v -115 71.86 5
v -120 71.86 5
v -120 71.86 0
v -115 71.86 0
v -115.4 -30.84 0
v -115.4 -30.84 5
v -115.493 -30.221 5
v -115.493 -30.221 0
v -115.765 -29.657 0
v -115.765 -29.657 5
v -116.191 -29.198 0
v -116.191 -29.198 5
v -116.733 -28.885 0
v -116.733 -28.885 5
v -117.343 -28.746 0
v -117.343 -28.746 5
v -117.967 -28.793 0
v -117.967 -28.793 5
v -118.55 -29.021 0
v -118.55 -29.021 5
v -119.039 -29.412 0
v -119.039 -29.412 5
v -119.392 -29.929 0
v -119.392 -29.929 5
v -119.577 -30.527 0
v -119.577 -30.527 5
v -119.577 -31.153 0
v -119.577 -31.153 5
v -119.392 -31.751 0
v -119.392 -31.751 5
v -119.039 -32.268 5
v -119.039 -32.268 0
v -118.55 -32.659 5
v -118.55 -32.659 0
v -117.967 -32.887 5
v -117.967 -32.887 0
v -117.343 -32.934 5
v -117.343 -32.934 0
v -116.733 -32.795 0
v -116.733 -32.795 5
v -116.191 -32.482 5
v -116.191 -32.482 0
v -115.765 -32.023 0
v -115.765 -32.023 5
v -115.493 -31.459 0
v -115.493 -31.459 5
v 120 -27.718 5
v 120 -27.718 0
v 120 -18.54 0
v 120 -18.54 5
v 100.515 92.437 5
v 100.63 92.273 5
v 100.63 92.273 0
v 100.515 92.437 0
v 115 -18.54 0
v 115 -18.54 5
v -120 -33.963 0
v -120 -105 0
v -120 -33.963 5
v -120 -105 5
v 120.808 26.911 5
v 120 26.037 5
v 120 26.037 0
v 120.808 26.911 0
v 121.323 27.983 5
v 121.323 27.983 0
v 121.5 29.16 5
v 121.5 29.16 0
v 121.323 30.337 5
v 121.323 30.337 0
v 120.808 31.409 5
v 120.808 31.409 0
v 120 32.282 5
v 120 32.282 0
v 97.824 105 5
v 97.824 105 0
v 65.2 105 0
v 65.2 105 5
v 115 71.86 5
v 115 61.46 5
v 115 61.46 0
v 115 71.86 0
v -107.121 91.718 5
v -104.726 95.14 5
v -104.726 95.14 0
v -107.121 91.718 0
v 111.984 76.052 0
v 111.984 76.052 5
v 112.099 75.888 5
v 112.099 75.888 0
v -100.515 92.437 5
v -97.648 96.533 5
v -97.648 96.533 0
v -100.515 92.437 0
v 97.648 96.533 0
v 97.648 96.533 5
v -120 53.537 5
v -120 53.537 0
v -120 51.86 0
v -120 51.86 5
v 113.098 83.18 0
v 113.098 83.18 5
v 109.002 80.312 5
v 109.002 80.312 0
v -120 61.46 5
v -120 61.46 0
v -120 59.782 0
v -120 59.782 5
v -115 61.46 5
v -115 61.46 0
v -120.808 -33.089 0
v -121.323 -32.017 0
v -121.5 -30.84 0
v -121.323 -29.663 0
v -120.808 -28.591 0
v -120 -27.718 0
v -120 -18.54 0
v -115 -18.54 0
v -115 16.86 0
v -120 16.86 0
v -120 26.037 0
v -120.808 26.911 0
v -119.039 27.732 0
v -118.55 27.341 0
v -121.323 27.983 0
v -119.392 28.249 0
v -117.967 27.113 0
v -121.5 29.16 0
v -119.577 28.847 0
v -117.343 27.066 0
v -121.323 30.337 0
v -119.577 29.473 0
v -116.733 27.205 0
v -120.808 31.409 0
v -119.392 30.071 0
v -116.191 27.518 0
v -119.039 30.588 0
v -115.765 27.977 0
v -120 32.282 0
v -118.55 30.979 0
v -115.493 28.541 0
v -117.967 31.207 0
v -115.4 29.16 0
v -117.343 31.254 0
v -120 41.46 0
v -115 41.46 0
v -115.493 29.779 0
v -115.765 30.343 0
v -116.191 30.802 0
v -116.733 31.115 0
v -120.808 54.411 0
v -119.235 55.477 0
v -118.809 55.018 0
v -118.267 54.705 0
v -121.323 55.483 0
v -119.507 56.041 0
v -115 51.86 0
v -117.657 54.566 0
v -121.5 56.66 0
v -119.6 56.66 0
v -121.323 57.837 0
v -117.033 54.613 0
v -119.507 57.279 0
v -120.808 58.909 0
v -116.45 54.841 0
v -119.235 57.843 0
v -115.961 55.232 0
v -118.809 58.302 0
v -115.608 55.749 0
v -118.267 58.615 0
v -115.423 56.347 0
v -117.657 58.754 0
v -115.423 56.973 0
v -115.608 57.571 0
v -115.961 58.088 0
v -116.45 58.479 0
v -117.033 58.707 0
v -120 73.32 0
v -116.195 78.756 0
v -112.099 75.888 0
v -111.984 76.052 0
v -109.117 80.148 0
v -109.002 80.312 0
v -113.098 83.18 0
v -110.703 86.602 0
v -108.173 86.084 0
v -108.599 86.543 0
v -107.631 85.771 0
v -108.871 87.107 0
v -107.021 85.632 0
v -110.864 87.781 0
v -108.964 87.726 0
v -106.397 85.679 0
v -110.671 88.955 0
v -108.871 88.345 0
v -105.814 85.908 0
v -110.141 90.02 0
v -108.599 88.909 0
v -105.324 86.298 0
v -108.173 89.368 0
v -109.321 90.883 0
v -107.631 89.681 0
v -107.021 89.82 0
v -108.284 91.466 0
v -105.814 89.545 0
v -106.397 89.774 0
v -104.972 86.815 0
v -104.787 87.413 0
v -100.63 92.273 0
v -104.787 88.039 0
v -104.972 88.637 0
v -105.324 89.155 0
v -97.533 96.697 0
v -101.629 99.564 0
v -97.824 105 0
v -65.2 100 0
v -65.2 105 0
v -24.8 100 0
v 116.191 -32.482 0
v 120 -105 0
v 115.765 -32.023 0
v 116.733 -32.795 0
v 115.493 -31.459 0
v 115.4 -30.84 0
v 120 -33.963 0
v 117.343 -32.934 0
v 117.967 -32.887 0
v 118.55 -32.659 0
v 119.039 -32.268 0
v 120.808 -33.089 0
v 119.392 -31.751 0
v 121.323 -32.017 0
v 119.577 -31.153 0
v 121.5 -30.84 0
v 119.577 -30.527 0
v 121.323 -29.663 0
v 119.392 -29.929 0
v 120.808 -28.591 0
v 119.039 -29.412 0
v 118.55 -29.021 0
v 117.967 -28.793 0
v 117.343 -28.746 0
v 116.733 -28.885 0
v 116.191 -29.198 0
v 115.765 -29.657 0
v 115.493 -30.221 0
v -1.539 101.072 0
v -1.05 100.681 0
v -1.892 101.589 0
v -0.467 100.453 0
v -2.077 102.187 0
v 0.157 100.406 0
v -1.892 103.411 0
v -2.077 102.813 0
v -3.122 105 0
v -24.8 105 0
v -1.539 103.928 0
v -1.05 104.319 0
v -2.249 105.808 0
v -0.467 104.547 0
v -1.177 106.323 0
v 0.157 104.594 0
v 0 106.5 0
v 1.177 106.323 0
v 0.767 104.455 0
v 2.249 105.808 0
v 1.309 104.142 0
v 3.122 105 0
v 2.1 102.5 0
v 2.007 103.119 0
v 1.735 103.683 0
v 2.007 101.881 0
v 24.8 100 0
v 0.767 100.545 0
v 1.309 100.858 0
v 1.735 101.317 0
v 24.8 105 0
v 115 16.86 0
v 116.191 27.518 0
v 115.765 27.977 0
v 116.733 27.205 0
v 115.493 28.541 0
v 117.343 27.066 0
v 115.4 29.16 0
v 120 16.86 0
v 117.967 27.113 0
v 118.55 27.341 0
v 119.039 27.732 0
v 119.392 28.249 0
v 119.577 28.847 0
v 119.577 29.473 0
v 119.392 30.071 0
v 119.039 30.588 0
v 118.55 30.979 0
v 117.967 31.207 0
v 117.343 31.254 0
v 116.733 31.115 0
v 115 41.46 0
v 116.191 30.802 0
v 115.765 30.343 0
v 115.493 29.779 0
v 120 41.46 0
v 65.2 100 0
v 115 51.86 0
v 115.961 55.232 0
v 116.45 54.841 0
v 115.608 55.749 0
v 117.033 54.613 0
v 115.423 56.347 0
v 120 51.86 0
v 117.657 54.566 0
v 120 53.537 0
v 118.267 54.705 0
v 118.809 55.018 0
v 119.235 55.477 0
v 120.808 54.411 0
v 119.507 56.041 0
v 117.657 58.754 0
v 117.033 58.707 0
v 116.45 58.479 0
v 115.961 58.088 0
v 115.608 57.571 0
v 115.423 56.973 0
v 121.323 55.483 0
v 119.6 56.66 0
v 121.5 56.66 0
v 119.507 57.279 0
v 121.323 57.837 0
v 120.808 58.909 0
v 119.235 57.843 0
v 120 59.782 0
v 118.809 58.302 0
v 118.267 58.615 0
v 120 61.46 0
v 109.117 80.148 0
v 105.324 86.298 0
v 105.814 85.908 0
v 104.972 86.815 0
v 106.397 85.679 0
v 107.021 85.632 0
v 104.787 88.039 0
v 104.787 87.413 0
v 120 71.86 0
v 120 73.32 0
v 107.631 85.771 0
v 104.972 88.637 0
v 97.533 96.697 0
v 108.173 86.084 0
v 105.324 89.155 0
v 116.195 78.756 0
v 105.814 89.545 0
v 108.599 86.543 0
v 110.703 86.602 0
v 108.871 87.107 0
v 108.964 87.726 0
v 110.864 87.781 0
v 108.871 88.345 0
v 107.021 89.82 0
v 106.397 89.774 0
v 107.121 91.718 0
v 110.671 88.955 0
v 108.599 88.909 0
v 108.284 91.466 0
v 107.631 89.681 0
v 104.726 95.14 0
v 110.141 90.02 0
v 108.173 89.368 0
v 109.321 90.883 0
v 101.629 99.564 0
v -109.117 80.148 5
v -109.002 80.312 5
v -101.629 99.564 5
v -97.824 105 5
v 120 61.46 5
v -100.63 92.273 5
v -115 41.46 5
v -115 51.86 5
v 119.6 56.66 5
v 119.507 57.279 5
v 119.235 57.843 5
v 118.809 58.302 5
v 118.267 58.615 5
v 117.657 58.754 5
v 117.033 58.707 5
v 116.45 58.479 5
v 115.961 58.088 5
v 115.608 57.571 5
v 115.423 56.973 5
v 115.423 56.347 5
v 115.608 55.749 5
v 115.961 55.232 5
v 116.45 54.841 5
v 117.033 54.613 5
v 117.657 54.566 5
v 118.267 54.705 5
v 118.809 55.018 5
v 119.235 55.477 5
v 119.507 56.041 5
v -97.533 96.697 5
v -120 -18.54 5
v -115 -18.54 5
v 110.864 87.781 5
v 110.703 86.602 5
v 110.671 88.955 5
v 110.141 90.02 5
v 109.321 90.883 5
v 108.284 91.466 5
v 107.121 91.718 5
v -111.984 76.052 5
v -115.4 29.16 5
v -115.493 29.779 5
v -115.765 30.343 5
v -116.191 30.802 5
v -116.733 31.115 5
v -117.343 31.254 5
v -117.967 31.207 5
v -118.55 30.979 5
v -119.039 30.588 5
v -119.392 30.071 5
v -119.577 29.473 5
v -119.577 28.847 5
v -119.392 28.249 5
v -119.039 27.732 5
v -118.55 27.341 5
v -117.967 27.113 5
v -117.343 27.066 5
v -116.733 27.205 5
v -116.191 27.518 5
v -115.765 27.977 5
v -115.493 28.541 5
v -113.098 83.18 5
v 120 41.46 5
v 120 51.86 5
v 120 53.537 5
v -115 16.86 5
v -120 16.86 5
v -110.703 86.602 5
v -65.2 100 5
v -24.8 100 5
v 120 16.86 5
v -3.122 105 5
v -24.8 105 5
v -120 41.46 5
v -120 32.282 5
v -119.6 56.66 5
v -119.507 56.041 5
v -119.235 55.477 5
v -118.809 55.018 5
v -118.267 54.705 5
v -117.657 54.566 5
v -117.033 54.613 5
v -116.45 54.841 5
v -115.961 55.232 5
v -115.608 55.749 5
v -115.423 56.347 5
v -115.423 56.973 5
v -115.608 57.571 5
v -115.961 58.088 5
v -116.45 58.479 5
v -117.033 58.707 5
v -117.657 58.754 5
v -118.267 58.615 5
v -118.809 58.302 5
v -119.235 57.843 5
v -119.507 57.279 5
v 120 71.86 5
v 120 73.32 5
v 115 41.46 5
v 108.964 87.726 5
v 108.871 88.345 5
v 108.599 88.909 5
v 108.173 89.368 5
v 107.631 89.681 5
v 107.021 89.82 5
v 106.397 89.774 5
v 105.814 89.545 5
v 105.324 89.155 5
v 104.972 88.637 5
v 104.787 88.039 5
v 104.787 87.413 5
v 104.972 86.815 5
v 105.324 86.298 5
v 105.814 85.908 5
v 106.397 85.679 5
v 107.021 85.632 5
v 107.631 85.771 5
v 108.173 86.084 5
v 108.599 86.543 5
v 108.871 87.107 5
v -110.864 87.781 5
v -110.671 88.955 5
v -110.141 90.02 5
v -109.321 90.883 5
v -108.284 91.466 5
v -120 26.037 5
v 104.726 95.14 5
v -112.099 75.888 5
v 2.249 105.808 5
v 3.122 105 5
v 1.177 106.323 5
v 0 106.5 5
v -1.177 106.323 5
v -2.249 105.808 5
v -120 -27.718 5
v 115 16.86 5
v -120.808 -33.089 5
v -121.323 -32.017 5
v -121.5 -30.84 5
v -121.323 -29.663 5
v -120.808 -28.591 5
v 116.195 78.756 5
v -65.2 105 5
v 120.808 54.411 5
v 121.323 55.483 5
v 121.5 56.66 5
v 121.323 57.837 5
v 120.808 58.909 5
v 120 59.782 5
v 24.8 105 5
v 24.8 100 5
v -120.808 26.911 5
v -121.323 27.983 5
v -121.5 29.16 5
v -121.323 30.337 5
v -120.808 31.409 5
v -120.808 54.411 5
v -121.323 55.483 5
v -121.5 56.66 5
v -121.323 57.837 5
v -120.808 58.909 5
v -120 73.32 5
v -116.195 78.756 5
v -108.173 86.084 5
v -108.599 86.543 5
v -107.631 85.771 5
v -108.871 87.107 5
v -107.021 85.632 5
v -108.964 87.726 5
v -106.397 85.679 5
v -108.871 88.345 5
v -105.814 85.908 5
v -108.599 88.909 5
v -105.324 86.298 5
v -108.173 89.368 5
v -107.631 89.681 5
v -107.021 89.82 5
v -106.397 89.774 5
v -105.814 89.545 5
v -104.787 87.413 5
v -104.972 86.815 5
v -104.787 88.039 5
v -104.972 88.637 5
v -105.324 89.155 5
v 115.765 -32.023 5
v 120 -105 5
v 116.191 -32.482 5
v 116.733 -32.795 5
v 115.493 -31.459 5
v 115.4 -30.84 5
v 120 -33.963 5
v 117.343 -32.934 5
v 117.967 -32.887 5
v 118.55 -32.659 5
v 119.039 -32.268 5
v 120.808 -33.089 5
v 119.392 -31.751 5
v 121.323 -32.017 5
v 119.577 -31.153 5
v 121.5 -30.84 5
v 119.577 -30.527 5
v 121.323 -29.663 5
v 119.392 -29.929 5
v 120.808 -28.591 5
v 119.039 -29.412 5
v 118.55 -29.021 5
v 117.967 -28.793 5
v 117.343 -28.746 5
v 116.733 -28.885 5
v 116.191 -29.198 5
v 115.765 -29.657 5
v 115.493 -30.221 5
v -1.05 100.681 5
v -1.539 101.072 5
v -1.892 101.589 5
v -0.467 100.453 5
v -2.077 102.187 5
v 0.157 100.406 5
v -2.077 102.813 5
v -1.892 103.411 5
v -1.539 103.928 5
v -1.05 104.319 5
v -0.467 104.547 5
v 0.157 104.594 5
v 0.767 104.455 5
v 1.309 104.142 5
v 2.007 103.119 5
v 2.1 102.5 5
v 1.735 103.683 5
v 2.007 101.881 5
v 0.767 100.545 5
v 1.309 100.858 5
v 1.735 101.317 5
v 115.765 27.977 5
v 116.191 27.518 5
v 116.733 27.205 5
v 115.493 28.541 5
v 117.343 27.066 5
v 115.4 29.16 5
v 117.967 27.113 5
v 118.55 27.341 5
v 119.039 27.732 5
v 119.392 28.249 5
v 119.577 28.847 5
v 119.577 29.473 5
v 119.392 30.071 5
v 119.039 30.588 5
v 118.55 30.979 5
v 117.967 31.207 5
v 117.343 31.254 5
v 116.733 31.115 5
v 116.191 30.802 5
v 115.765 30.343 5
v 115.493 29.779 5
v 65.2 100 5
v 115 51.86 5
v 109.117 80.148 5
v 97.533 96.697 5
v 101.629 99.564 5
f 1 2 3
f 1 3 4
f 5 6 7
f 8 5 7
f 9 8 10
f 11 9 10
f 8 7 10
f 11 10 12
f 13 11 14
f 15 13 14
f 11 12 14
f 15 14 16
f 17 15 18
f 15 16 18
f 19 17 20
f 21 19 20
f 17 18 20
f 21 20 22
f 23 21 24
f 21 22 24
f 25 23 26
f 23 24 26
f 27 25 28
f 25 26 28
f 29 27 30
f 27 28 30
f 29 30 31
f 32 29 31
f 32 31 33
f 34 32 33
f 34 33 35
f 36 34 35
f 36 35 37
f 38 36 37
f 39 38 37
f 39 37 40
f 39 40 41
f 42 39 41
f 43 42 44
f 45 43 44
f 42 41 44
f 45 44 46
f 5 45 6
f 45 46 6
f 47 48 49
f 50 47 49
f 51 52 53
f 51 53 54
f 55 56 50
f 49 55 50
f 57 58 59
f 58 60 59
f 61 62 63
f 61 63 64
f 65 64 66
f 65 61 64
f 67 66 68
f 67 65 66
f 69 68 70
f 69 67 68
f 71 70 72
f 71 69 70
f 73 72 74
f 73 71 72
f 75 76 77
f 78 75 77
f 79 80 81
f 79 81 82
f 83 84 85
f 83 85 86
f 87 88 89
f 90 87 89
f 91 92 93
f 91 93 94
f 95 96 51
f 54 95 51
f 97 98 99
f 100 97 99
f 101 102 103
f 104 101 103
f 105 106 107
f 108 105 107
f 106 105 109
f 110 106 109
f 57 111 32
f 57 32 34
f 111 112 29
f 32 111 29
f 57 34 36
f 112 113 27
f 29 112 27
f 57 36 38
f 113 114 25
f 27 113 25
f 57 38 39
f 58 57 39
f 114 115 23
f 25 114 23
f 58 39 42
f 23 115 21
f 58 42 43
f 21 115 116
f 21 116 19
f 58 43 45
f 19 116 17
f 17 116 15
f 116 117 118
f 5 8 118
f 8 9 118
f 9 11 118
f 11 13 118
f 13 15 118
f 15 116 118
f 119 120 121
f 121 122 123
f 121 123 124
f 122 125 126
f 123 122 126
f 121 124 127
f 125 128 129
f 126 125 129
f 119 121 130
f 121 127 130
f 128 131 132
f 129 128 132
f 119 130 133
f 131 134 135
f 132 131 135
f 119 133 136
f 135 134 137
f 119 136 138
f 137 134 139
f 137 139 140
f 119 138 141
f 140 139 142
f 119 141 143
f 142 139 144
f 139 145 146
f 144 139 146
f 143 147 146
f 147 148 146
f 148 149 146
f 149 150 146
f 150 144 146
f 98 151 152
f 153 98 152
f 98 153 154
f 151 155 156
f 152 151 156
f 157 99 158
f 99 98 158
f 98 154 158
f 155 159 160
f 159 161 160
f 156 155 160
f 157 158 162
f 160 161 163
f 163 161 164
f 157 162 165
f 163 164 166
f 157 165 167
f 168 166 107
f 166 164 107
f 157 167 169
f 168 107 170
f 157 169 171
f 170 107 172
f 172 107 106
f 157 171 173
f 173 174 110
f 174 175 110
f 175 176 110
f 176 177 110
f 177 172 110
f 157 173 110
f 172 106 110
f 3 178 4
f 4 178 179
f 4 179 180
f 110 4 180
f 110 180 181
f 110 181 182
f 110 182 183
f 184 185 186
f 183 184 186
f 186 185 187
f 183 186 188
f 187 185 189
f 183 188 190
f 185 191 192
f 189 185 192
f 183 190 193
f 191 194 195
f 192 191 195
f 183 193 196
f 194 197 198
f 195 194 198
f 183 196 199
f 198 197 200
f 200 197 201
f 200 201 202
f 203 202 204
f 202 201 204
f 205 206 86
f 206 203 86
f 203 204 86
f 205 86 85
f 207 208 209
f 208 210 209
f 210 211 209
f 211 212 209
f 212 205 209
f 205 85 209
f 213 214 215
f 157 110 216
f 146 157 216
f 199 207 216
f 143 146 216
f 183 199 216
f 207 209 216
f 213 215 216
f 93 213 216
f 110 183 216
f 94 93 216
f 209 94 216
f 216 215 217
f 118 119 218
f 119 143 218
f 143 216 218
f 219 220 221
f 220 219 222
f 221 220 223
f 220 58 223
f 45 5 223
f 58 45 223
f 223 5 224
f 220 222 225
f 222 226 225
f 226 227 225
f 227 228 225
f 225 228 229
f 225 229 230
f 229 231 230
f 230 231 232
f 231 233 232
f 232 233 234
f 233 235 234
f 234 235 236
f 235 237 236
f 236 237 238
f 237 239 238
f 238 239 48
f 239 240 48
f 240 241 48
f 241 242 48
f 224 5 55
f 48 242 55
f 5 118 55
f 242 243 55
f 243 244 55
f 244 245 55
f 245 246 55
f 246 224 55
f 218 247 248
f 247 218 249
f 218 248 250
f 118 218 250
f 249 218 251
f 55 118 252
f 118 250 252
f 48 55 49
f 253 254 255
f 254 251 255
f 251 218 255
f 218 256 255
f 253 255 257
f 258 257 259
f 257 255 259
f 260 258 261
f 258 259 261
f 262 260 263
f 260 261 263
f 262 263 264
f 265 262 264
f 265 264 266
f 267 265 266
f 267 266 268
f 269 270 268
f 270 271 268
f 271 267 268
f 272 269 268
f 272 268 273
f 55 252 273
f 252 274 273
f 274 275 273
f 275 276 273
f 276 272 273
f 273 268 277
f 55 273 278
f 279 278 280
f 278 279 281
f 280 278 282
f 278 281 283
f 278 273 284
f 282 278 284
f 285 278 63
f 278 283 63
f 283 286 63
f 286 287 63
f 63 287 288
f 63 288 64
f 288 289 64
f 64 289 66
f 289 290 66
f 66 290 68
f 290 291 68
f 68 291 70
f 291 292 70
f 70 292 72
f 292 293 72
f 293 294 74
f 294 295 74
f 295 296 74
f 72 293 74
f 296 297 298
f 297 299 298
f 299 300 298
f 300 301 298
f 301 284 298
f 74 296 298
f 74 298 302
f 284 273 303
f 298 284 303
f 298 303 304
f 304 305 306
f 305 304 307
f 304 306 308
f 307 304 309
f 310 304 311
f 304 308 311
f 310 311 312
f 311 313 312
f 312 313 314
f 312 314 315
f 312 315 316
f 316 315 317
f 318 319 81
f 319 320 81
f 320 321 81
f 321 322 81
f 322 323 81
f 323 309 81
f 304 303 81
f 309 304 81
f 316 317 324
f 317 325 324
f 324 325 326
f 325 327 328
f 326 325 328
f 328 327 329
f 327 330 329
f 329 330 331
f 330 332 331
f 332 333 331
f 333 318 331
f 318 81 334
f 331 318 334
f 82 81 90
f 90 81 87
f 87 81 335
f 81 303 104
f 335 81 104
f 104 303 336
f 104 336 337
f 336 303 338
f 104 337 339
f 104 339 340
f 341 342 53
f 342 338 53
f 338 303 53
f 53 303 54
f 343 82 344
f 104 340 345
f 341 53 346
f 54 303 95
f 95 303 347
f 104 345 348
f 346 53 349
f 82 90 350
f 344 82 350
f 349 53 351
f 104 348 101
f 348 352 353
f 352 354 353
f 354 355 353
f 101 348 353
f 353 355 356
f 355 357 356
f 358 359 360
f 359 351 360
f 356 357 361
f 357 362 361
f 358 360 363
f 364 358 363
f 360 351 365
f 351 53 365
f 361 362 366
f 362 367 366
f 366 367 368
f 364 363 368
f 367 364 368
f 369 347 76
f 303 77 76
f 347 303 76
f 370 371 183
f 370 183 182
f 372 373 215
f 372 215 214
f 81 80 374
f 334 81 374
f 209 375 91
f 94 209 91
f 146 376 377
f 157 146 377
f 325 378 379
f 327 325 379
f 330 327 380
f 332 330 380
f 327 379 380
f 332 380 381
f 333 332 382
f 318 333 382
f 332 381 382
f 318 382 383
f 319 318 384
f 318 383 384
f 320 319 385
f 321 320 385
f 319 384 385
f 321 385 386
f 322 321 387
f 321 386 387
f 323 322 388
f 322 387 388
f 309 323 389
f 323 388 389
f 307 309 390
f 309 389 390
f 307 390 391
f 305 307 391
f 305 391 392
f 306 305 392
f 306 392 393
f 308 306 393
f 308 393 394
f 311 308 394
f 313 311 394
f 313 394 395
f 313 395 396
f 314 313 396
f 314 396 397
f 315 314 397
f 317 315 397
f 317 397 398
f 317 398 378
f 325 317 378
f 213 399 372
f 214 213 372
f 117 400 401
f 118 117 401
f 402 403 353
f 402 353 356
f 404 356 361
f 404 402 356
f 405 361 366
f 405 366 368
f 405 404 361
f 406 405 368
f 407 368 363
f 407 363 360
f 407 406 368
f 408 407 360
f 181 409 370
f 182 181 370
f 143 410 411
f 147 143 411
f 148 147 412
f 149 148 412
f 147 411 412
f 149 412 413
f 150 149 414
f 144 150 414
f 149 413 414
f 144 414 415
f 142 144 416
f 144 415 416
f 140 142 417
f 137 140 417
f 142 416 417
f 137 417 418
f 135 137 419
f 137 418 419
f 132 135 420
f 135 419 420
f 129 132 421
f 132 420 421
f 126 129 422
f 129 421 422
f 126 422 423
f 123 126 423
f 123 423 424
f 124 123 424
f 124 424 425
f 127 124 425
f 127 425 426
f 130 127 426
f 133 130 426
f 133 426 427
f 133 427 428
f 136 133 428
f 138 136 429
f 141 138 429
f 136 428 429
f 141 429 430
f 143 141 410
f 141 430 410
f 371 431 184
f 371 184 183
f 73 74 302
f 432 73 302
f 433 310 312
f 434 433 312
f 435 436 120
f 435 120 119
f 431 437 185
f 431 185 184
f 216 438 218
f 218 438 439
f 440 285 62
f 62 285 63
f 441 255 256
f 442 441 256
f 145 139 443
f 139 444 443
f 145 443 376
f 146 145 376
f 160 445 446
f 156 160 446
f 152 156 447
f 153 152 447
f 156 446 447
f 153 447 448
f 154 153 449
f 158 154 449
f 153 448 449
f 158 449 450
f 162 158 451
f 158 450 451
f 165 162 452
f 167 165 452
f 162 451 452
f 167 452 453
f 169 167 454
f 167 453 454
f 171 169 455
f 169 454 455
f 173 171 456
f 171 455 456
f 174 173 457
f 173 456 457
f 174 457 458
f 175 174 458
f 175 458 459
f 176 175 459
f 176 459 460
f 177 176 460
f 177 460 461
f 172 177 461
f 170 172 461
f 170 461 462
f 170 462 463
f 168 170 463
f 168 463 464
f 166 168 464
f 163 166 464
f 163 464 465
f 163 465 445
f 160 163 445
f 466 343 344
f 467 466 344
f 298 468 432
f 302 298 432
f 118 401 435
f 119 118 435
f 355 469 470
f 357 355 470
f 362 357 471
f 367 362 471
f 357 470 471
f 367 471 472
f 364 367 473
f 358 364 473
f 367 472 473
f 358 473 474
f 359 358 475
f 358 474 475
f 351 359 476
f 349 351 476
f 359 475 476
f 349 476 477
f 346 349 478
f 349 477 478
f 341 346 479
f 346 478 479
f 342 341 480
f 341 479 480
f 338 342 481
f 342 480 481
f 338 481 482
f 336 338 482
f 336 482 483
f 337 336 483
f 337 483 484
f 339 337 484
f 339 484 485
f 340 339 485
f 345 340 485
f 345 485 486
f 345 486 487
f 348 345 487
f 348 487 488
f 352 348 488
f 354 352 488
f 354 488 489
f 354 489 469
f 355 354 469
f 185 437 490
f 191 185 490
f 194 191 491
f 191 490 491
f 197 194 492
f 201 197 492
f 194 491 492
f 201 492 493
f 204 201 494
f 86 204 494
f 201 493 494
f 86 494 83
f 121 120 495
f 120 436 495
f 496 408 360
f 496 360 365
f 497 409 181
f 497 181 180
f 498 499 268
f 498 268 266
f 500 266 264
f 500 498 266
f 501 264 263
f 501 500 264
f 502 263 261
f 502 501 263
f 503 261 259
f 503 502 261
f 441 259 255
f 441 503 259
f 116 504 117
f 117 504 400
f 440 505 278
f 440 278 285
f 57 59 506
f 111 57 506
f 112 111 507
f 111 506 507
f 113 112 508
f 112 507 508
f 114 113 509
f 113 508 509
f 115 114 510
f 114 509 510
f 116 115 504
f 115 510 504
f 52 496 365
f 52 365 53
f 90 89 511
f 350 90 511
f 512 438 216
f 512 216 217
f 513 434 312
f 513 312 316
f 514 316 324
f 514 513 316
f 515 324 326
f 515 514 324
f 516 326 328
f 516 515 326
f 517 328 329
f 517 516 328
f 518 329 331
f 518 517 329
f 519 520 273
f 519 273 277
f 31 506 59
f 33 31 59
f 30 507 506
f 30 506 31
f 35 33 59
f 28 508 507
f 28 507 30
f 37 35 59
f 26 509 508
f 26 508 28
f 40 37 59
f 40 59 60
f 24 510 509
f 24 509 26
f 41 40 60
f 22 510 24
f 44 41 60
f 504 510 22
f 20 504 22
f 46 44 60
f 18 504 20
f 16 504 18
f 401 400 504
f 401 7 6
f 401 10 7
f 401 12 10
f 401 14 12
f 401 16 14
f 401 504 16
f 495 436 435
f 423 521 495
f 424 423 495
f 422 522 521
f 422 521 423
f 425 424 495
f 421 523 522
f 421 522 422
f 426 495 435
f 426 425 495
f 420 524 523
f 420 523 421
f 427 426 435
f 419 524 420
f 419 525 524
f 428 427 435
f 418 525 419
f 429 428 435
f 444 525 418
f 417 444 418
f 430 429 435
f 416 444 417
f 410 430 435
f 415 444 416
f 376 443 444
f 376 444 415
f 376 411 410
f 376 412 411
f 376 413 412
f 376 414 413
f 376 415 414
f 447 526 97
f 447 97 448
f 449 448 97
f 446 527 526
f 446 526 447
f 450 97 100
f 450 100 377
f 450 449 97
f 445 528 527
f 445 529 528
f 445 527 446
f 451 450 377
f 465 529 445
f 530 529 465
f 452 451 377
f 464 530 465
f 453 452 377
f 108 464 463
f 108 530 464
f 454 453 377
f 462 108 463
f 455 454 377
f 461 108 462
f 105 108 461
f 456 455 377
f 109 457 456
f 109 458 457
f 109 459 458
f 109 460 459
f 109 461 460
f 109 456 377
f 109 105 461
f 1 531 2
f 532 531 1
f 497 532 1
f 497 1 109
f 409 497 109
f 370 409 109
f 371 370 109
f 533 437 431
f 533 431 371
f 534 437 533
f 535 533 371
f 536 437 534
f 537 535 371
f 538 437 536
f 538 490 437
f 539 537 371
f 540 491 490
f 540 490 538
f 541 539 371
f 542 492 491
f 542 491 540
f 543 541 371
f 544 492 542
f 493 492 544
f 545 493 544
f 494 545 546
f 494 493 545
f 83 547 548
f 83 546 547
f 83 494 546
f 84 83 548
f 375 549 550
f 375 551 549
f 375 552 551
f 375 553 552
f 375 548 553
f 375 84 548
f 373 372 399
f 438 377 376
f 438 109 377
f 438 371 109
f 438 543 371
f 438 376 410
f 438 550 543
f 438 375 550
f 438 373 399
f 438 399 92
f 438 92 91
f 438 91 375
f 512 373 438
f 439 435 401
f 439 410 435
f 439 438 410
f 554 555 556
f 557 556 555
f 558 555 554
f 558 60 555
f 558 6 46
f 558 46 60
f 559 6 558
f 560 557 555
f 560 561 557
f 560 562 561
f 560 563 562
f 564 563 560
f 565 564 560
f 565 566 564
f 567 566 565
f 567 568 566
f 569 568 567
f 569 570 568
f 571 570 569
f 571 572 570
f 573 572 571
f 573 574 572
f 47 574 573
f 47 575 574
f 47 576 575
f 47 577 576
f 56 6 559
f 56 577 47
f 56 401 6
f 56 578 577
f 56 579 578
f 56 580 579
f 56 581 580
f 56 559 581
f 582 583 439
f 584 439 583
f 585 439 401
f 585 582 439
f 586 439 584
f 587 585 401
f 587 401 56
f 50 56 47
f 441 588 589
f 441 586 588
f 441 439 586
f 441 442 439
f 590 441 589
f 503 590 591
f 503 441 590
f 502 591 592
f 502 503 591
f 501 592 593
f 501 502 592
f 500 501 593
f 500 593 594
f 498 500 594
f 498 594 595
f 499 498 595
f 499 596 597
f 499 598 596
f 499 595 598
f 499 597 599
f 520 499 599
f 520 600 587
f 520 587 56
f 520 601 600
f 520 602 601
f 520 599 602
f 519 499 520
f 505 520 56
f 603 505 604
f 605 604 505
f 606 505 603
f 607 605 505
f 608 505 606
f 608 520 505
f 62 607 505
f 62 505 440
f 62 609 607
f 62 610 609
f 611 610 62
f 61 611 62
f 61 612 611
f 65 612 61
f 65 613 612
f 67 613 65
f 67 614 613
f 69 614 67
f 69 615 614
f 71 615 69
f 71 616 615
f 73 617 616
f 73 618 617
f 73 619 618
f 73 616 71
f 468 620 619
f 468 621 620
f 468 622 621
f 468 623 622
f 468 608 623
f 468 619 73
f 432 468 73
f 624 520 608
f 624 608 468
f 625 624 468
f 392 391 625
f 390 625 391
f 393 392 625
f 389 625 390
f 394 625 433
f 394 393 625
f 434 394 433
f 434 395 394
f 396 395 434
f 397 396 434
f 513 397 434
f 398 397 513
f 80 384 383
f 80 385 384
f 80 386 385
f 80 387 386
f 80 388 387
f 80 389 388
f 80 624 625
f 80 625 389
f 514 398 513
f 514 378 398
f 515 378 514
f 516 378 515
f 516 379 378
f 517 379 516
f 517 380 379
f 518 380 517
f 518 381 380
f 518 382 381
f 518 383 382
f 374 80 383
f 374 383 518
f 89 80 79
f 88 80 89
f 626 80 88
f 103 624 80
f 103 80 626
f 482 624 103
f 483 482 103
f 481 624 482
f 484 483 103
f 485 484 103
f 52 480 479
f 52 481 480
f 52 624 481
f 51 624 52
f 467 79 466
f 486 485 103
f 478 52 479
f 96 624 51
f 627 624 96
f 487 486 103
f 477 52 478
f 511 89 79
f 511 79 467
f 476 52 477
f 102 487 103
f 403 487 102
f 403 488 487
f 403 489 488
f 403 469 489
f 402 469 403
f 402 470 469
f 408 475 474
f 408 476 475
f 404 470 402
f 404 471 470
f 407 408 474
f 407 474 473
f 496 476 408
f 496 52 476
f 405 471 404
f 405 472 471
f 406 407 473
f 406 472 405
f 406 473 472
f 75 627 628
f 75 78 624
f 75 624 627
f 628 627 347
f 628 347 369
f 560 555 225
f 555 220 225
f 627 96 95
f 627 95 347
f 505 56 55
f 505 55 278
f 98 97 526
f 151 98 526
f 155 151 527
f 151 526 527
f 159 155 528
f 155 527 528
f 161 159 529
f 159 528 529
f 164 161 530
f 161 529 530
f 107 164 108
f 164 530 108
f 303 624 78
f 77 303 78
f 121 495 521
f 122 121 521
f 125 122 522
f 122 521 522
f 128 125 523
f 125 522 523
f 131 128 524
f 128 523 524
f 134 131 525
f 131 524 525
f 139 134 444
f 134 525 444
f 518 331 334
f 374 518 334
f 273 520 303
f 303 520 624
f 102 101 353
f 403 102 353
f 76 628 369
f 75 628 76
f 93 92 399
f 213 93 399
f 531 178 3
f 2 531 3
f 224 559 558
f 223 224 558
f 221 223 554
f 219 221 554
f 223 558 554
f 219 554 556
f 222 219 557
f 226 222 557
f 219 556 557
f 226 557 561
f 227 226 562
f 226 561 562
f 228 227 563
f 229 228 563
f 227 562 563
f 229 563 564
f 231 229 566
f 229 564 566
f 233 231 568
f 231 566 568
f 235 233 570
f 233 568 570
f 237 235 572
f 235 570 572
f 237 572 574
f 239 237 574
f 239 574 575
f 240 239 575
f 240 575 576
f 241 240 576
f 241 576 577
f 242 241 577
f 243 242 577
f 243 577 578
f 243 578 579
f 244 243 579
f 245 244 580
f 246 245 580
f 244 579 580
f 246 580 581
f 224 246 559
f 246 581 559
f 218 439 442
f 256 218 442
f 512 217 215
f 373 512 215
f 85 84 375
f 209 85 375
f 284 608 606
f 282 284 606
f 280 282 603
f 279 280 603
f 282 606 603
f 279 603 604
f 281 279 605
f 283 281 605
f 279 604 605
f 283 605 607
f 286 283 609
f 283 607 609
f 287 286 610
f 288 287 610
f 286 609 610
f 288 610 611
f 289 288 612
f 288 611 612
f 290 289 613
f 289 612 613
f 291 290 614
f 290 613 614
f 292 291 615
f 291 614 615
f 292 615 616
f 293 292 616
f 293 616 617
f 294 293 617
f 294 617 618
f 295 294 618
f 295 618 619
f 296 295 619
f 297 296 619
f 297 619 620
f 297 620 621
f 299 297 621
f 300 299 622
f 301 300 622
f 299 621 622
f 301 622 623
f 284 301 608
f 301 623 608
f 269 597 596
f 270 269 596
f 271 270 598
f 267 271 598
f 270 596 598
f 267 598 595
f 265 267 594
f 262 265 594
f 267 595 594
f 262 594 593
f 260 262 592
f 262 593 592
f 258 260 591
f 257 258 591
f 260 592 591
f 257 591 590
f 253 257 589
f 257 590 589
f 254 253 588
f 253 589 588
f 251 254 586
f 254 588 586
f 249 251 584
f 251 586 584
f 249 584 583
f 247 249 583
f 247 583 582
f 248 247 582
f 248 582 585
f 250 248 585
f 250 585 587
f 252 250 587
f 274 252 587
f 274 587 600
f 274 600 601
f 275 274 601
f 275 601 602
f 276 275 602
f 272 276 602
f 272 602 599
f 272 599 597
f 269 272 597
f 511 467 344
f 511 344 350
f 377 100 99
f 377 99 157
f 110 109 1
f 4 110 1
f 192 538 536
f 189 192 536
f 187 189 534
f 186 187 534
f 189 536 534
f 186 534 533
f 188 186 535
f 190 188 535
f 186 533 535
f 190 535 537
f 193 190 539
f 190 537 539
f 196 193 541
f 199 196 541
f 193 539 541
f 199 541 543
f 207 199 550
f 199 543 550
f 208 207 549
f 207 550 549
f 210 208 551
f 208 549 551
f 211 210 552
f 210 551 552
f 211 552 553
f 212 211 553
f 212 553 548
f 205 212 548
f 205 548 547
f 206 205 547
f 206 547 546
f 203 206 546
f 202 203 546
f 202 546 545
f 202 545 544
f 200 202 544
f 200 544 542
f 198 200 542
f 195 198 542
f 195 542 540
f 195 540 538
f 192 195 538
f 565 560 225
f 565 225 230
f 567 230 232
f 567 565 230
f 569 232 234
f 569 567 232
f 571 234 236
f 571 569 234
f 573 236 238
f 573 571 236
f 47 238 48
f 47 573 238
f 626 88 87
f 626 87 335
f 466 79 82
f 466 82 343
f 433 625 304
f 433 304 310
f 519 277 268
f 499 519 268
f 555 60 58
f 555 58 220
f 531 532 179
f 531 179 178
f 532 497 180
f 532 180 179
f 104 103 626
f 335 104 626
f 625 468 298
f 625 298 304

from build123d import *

# Parameters (mm, degrees)
BOSS_EXTRUDE1_DEPTH = 5
CUT_EXTRUDE1_DEPTH  = 5
CUT_EXTRUDE4_DEPTH  = 5
BOSS_EXTRUDE3_DEPTH = 5
SKETCH8_R           = 2.1
SKETCH8_W           = 5
SKETCH8_H           = 10
SKETCH8_W_2         = 40
SKETCH8_H_2         = 5
CUT_EXTRUDE5_DEPTH  = 10
BOSS_EXTRUDE4_DEPTH = 5
SKETCH10_W          = 77.5
SKETCH10_H          = 80
BOSS_EXTRUDE5_DEPTH = 5
CUT_EXTRUDE6_DEPTH  = 5
SKETCH12_R          = 2.1
SKETCH12_W          = 5
SKETCH12_H          = 35
CUT_EXTRUDE7_DEPTH  = 5
BOSS_EXTRUDE6_DEPTH = 5
SKETCH14_W          = 5
SKETCH14_H          = 10.4
SKETCH14_H_2        = 35.4
SKETCH14_W_2        = 40.4
SKETCH14_H_3        = 5
CUT_EXTRUDE8_DEPTH  = 10


with BuildPart() as part:
    # Sketch1 → Boss-Extrude1 (new body)
    with BuildSketch(Plane.XY):
        Polygon((-120, 40), (-42.5, 40), (-42.5, -40), (-120, -40), (-120, -105), (120, -105), (120, -40), (42.5, -40), (42.5, 40), (120, 40), (120, 105), (-120, 105), align=None)
    extrude(amount=BOSS_EXTRUDE1_DEPTH)

    # Sketch2 → Cut-Extrude1 (cut)
    with BuildSketch(Plane.XY.offset(5)):
        Polygon((40, -55.717967697), (-40, -55.717967697), (-80, -125), (-40, -194.282032303), (40, -194.282032303), (80, -125), align=None)
    extrude(amount=-CUT_EXTRUDE1_DEPTH, mode=Mode.SUBTRACT)

    # Sketch5 → Cut-Extrude4 (cut)
    with BuildSketch(Plane.XY.offset(5)):
        Polygon((-97.823933369, 105), (-120, 73.319904814), (-120, 105), align=None)
        Polygon((97.823933369, 105), (120, 105), (120, 73.319904814), align=None)
    extrude(amount=-CUT_EXTRUDE4_DEPTH, mode=Mode.SUBTRACT)

    # Sketch7 → Boss-Extrude3 (add)
    with BuildSketch(Plane(origin=(0, 0, 0), x_dir=(-1, 0, 0), z_dir=(0, 0, -1))):
        Polygon((120, -40), (120, -105), (89.53, -105), (111.53, -122.5), (129.53, -122.5), (129.53, -40), align=None)
    boss_extrude3 = extrude(amount=-BOSS_EXTRUDE3_DEPTH)

    # Mirror2: Boss-Extrude3 across plane
    add(boss_extrude3.mirror(Plane(origin=(0, 0, 0), x_dir=(0, 0, 1), z_dir=(1, 0, 0))))

    # Sketch8 → Cut-Extrude5 (cut)
    with BuildSketch(Plane.XY.offset(5)):
        with Locations((0, 102.5)):
            Circle(SKETCH8_R)
        with Locations((106.863886883, 87.726296546)):
            Circle(SKETCH8_R)
        with Locations((117.5, 56.659952407)):
            Circle(SKETCH8_R)
        with Locations(Location((-117.5, 56.659952407, 0), (0, 0, 180))):
            Circle(SKETCH8_R)
        with Locations(Location((-106.863886883, 87.726296546, 0), (0, 0, 180))):
            Circle(SKETCH8_R)
        Polygon((-113.212934267, 83.015713003), (-116.080245989, 78.9195534), (-111.984086387, 76.052241679), (-109.116774665, 80.148401281), align=None)
        Polygon((-100.514839499, 92.436880089), (-104.610999102, 95.304191811), (-101.74368738, 99.400351413), (-97.647527778, 96.533039691), align=None)
        with Locations((-117.5, 46.659952407)):
            Rectangle(SKETCH8_W, SKETCH8_H)
        with Locations((-117.5, 66.659952407)):
            Rectangle(SKETCH8_W, SKETCH8_H)
        with Locations((-45, 102.5)):
            Rectangle(SKETCH8_W_2, SKETCH8_H_2)
        with Locations((45, 102.5)):
            Rectangle(SKETCH8_W_2, SKETCH8_H_2)
        with Locations((117.5, 66.659952407)):
            Rectangle(SKETCH8_W, SKETCH8_H)
        with Locations((117.5, 46.659952407)):
            Rectangle(SKETCH8_W, SKETCH8_H)
        Polygon((104.610999102, 95.304191811), (101.74368738, 99.400351413), (97.647527778, 96.533039691), (100.514839499, 92.436880089), align=None)
        Polygon((109.116774665, 80.148401281), (113.212934267, 83.015713003), (116.080245989, 78.9195534), (111.984086387, 76.052241679), align=None)
    extrude(amount=-CUT_EXTRUDE5_DEPTH, mode=Mode.SUBTRACT)

    # Sketch9 → Boss-Extrude4 (add)
    with BuildSketch(Plane.XY.offset(5)):
        with BuildLine():
            Line((-3.122498999, 105), (3.122498999, 105))
            ThreePointArc((3.122498999, 105), (0, 106.5), (-3.122498999, 105))
        make_face()
        with BuildLine():
            Line((107.121331088, 91.718003259), (110.702602281, 86.601901555))
            ThreePointArc((110.702602281, 86.601901555), (110.140814565, 90.020145923), (107.121331088, 91.718003259))
        make_face()
        with BuildLine():
            Line((120, 59.782451406), (120, 53.537453408))
            ThreePointArc((120, 53.537453408), (121.5, 56.659952407), (120, 59.782451406))
        make_face()
        with BuildLine():
            Line((-120, 59.782451406), (-120, 53.537453408))
            ThreePointArc((-120, 53.537453408), (-121.5, 56.659952407), (-120, 59.782451406))
        make_face()
        with BuildLine():
            Line((-107.121331088, 91.718003259), (-110.702602281, 86.601901555))
            ThreePointArc((-110.702602281, 86.601901555), (-110.140814565, 90.020145923), (-107.121331088, 91.718003259))
        make_face()
    extrude(amount=-BOSS_EXTRUDE4_DEPTH)

    # Sketch10 → Boss-Extrude5 (add)
    with BuildSketch(Plane.XY.offset(5)):
        with Locations((-81.25, 0)):
            Rectangle(SKETCH10_W, SKETCH10_H)
        Polygon((-68.452994616, -105), (68.452994616, -105), (40, -55.717967697), (-40, -55.717967697), align=None)
        with Locations((81.25, 0)):
            Rectangle(SKETCH10_W, SKETCH10_H)
    extrude(amount=-BOSS_EXTRUDE5_DEPTH)

    # Sketch11 → Cut-Extrude6 (cut)
    with BuildSketch(Plane.XY.offset(5)):
        Polygon((-120, -40), (-120, -105), (120, -105), (120, -40), (129.53, -40), (129.53, -122.5), (-129.53, -122.5), (-129.53, -40), align=None)
    extrude(amount=-CUT_EXTRUDE6_DEPTH, mode=Mode.SUBTRACT)

    # Sketch12 → Cut-Extrude7 (cut)
    with BuildSketch(Plane.XY.offset(5)):
        with Locations((-117.5, 29.159952407)):
            Circle(SKETCH12_R)
        with Locations((-117.5, -30.840047593)):
            Circle(SKETCH12_R)
        with Locations(Location((117.5, -30.840047593, 0), (0, 0, 180))):
            Circle(SKETCH12_R)
        with Locations(Location((117.5, 29.159952407, 0), (0, 0, 180))):
            Circle(SKETCH12_R)
        with Locations((-117.5, -0.840047593)):
            Rectangle(SKETCH12_W, SKETCH12_H)
        with Locations((117.5, -0.840047593)):
            Rectangle(SKETCH12_W, SKETCH12_H)
    extrude(amount=-CUT_EXTRUDE7_DEPTH, mode=Mode.SUBTRACT)

    # Sketch13 → Boss-Extrude6 (add)
    with BuildSketch(Plane.XY.offset(5)):
        with BuildLine():
            Line((-120, 32.282451406), (-120, 26.037453408))
            ThreePointArc((-120, 26.037453408), (-121.5, 29.159952407), (-120, 32.282451406))
        make_face()
        with BuildLine():
            Line((-120, -27.717548594), (-120, -33.962546592))
            ThreePointArc((-120, -33.962546592), (-121.5, -30.840047593), (-120, -27.717548594))
        make_face()
        with BuildLine():
            Line((120, -27.717548594), (120, -33.962546592))
            ThreePointArc((120, -33.962546592), (121.5, -30.840047593), (120, -27.717548594))
        make_face()
        with BuildLine():
            Line((120, 32.282451406), (120, 26.037453408))
            ThreePointArc((120, 26.037453408), (121.5, 29.159952407), (120, 32.282451406))
        make_face()
    extrude(amount=-BOSS_EXTRUDE6_DEPTH)

    # Sketch14 → Cut-Extrude8 (cut)
    with BuildSketch(Plane.XY.offset(5)):
        Polygon((-104.725691571, 95.140345427), (-100.629531968, 92.273033705), (-97.532835309, 96.696886076), (-101.628994911, 99.564197797), align=None)
        Polygon((-112.098778856, 75.888395294), (-116.194938458, 78.755707016), (-113.098241799, 83.179559387), (-109.002082196, 80.312247665), align=None)
        with Locations((-117.5, 66.659952407)):
            Rectangle(SKETCH14_W, SKETCH14_H)
        with Locations((-117.5, 46.659952407)):
            Rectangle(SKETCH14_W, SKETCH14_H)
        with Locations((-117.5, -0.840047593)):
            Rectangle(SKETCH14_W, SKETCH14_H_2)
        with Locations((-45, 102.5)):
            Rectangle(SKETCH14_W_2, SKETCH14_H_3)
        with Locations((45, 102.5)):
            Rectangle(SKETCH14_W_2, SKETCH14_H_3)
        with Locations((117.5, -0.840047593)):
            Rectangle(SKETCH14_W, SKETCH14_H_2)
        with Locations((117.5, 46.659952407)):
            Rectangle(SKETCH14_W, SKETCH14_H)
        with Locations((117.5, 66.659952407)):
            Rectangle(SKETCH14_W, SKETCH14_H)
        Polygon((113.098241799, 83.179559387), (109.002082196, 80.312247665), (112.098778856, 75.888395294), (116.194938458, 78.755707016), align=None)
        Polygon((97.532835309, 96.696886076), (101.628994911, 99.564197797), (104.725691571, 95.140345427), (100.629531968, 92.273033705), align=None)
    extrude(amount=-CUT_EXTRUDE8_DEPTH, mode=Mode.SUBTRACT)


solid = part.part
